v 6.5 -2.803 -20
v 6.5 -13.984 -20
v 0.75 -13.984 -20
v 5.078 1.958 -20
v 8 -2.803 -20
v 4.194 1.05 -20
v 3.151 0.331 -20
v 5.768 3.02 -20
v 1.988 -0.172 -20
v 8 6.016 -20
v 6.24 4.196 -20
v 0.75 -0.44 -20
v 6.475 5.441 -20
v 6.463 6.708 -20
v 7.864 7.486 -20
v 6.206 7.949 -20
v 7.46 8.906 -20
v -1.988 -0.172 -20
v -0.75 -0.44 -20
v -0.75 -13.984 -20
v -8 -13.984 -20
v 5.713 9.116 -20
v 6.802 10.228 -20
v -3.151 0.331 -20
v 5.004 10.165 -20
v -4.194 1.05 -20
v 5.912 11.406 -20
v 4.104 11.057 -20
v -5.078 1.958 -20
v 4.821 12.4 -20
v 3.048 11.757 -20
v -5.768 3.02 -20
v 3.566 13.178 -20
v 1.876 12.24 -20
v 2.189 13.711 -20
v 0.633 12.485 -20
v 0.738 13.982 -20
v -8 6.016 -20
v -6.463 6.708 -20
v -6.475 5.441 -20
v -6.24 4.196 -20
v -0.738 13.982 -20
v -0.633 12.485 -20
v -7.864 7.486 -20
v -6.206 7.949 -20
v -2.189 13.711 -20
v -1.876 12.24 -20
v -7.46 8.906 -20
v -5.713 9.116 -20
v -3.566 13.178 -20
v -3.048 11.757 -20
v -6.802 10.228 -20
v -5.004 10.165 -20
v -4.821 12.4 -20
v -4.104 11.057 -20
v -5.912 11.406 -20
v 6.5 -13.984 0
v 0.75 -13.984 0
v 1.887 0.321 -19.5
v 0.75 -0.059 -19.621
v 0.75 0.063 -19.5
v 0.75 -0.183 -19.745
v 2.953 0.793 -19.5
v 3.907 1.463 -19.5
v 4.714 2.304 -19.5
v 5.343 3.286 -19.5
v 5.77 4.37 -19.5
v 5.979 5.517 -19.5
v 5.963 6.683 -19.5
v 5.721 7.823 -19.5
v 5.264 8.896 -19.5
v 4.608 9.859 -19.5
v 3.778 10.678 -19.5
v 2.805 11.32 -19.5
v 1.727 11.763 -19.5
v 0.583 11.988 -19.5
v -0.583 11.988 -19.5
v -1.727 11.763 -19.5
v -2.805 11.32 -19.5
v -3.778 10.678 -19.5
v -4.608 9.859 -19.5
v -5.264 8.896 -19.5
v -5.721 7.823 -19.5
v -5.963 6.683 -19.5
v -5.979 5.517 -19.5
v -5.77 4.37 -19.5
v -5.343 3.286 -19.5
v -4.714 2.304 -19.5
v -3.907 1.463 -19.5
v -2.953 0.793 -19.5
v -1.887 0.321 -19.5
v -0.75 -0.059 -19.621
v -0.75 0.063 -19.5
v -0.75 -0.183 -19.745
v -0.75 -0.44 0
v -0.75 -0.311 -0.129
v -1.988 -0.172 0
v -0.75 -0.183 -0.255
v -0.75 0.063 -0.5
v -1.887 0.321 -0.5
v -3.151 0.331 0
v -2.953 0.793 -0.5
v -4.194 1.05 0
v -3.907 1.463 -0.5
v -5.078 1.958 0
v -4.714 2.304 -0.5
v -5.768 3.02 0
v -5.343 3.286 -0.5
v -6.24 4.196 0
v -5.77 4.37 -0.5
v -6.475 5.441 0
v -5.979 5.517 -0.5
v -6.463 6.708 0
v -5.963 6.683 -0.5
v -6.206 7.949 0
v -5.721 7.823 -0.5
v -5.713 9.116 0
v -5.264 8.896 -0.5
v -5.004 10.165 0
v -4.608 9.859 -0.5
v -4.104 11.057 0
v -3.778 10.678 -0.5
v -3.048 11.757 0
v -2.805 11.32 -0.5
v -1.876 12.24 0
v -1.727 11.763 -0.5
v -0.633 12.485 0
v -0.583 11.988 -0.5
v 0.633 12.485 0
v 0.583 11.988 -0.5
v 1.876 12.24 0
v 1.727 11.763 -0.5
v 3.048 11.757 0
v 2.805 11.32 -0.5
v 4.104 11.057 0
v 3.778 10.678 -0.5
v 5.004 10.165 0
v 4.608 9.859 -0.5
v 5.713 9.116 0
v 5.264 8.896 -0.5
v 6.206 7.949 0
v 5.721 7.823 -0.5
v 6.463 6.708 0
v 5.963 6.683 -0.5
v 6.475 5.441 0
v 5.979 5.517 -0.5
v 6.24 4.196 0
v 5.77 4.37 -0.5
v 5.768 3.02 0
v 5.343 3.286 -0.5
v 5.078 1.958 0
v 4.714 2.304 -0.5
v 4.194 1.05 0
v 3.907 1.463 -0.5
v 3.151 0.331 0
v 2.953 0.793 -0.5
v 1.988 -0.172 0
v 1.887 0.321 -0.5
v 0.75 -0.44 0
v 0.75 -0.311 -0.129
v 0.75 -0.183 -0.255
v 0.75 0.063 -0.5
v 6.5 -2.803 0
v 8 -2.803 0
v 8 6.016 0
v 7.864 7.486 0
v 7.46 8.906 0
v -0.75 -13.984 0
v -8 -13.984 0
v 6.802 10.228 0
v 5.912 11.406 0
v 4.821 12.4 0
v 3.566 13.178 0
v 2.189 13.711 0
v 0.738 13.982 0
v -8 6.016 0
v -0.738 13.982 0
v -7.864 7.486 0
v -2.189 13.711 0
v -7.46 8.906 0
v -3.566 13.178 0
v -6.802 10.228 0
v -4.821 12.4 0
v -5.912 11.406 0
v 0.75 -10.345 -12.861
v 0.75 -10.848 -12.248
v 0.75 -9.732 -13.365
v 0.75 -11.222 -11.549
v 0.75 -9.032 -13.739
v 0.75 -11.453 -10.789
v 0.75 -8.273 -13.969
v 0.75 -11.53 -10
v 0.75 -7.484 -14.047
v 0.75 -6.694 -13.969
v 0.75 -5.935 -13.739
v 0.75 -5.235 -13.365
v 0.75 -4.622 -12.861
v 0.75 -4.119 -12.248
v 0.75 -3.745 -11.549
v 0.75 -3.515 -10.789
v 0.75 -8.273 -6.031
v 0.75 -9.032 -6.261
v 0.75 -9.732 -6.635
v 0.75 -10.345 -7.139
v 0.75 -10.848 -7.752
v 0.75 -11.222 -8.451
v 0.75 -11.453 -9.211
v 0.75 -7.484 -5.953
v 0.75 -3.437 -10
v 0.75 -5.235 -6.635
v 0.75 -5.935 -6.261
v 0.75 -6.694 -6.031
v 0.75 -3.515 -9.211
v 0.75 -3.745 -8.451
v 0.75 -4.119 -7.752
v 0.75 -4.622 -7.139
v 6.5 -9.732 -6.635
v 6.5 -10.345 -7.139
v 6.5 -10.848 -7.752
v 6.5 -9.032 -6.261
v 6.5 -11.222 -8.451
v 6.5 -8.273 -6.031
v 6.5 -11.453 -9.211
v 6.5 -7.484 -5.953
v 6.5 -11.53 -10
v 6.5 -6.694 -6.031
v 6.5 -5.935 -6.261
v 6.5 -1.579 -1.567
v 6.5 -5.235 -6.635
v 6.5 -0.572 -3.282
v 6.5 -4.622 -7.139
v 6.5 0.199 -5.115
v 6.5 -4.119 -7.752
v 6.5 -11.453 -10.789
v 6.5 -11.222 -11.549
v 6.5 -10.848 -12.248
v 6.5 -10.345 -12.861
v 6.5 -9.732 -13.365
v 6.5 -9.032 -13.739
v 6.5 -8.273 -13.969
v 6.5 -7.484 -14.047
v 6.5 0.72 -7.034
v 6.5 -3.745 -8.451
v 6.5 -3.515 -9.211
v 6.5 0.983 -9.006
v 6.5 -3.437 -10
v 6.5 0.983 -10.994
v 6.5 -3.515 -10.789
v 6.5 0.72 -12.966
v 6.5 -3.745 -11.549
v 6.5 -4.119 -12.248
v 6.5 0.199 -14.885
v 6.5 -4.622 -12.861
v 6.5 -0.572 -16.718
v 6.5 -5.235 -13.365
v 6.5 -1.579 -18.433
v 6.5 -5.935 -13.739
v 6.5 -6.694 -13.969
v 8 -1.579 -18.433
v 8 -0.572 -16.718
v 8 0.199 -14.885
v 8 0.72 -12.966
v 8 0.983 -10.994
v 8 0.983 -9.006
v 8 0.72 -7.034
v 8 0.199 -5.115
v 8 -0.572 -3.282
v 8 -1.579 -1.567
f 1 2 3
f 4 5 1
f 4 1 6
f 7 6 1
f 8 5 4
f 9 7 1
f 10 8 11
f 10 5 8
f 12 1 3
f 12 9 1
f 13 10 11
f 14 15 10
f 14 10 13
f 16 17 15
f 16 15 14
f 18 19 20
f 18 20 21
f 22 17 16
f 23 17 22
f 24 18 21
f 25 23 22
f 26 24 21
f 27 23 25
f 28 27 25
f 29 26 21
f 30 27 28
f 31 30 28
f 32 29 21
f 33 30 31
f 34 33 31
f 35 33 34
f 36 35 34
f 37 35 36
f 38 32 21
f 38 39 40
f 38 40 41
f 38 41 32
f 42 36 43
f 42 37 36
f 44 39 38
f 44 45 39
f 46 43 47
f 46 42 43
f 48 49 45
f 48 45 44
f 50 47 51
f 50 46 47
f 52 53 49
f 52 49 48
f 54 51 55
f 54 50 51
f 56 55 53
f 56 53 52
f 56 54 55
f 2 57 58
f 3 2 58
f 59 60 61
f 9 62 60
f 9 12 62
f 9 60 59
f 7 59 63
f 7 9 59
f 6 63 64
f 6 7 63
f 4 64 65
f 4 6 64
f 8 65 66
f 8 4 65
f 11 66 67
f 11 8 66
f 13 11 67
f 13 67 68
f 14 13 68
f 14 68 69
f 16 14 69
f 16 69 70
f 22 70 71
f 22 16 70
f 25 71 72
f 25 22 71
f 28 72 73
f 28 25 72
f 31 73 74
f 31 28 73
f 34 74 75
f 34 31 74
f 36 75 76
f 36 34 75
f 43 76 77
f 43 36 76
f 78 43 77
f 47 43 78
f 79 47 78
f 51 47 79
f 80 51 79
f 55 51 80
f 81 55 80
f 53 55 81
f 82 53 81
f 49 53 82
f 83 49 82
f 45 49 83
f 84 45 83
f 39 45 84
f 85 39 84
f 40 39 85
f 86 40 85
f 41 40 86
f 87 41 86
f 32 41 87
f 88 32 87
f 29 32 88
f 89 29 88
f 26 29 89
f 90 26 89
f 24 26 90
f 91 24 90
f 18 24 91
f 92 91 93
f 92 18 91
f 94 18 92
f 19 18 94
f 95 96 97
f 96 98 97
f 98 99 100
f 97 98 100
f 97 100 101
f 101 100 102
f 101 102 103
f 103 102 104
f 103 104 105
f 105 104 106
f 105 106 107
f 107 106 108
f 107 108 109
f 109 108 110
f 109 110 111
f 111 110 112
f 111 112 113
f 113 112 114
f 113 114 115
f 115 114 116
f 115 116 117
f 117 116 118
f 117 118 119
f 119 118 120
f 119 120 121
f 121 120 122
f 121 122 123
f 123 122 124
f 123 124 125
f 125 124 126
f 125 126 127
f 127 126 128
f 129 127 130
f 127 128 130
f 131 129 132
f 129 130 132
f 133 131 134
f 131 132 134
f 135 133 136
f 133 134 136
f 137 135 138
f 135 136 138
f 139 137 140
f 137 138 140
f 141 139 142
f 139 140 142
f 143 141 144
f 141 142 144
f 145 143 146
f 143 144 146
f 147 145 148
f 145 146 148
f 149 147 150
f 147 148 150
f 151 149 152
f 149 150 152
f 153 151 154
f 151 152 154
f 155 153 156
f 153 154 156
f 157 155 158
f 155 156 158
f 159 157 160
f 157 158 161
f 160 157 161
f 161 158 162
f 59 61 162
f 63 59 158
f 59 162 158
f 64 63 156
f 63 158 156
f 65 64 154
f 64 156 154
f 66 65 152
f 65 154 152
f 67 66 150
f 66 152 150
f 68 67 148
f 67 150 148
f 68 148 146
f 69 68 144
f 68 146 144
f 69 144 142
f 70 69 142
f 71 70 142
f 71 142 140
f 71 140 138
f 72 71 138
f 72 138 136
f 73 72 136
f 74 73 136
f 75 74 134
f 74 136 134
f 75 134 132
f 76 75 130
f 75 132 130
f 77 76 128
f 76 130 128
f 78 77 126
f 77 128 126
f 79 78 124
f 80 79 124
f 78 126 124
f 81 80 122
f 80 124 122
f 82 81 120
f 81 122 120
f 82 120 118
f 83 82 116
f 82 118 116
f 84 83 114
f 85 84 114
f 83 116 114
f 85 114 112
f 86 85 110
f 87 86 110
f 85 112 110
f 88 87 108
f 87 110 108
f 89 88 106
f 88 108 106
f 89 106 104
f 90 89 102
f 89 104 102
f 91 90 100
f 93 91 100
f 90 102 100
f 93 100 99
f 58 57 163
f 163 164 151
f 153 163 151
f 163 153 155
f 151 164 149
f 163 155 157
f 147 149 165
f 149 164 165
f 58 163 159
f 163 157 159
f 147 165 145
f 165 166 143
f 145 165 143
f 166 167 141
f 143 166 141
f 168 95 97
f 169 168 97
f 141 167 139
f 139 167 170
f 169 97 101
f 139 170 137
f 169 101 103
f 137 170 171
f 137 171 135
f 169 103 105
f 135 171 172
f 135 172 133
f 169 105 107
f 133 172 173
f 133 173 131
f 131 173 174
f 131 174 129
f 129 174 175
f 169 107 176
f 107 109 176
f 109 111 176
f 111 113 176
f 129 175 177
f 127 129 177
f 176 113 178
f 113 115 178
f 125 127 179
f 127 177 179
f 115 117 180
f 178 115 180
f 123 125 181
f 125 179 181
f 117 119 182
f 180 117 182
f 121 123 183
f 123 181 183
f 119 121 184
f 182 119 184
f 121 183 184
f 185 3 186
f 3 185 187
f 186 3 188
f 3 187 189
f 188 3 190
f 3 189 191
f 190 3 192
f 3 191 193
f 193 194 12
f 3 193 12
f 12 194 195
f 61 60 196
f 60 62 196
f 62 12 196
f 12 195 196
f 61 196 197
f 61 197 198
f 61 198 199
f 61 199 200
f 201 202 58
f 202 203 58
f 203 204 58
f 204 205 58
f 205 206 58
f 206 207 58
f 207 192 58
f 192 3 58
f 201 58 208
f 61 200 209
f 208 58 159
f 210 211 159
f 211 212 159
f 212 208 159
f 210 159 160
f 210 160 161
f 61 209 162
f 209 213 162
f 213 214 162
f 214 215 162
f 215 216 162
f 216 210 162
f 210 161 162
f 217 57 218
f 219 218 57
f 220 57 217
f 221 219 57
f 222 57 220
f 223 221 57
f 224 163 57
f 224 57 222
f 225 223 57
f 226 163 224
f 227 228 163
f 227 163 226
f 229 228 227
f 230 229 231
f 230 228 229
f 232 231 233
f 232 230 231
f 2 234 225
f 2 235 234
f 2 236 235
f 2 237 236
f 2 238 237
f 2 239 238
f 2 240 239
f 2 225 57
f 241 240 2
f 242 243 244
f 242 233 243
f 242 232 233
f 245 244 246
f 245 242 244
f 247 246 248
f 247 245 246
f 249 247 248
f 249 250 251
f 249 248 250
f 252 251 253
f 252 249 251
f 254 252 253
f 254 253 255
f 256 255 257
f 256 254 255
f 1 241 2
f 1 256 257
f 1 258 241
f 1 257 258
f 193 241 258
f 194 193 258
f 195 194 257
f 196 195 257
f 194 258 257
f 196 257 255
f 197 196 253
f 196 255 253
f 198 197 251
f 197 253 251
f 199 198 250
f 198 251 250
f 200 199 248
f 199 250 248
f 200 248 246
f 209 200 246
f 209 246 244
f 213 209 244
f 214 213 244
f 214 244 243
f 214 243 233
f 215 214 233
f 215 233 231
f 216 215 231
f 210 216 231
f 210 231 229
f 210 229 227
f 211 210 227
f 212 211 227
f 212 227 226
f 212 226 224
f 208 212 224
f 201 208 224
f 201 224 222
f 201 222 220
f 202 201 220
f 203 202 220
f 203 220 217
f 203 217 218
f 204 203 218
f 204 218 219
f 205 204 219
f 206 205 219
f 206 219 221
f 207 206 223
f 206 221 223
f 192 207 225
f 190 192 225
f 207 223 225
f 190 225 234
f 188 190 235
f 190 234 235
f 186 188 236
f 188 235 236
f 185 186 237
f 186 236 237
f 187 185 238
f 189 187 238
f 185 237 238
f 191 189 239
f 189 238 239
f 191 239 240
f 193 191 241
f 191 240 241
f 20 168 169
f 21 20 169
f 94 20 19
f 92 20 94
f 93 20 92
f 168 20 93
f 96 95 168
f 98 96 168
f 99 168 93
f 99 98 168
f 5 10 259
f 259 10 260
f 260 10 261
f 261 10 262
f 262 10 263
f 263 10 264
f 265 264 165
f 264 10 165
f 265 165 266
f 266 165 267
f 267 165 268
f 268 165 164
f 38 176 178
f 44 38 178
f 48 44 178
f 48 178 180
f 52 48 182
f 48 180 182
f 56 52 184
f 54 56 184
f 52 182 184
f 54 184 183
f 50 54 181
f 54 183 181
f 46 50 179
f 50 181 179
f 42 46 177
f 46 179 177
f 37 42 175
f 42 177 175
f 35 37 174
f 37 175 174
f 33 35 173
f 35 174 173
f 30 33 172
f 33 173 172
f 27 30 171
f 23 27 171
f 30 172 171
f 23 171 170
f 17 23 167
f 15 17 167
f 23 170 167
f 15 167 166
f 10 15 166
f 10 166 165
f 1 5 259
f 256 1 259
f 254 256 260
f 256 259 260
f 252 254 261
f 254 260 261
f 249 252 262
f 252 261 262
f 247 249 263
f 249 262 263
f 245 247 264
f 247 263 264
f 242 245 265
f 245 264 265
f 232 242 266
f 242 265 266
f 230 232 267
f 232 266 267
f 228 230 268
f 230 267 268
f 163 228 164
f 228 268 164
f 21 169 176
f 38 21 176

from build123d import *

# Parameters (mm, degrees)
ESTRUSIONE_ESTRUSIONE1_DEPTH = 20
SCHIZZO3_R                   = 6
TAGLIO_ESTRUSIONE1_DEPTH     = 26.699370322
SCHIZZO4_W                   = 1.5
SCHIZZO4_H                   = 14.04705955
TAGLIO_ESTRUSIONE2_DEPTH     = 26.699370322
SCHIZZO5_R                   = 15
TAGLIO_ESTRUSIONE3_DEPTH     = 1.5
TAGLIO_ESTRUSIONE4_REACH     = 30.403
SCHIZZO6_R                   = 4.046600507
SMUSSO2_SIZE                 = 0.5
SMUSSO3_SIZE                 = 0.5


with BuildPart() as part:
    # Schizzo2 → Estrusione-Estrusione1 (new body)
    with BuildSketch(Plane.XY):
        with BuildLine():
            Line((8, -13.983665425), (-8, -13.983665425))
            Line((-8, -13.983665425), (-8, 6.016334575))
            ThreePointArc((-8, 6.016334575), (0, 14.016334575), (8, 6.016334575))
            Line((8, 6.016334575), (8, -13.983665425))
        make_face()
    extrude(amount=-ESTRUSIONE_ESTRUSIONE1_DEPTH)

    # Schizzo3 → Taglio-Estrusione1 (cut, through all)
    with BuildSketch(Plane.XY):
        with Locations((0, 6.016334575)):
            Circle(SCHIZZO3_R)
    extrude(amount=-TAGLIO_ESTRUSIONE1_DEPTH, mode=Mode.SUBTRACT)

    # Schizzo4 → Taglio-Estrusione2 (cut, through all)
    with BuildSketch(Plane.XY):
        with Locations((0, -6.96013565)):
            Rectangle(SCHIZZO4_W, SCHIZZO4_H)
    extrude(amount=-TAGLIO_ESTRUSIONE2_DEPTH, mode=Mode.SUBTRACT)

    # Schizzo5 → Taglio-Estrusione3 (cut)
    with BuildSketch(Plane(origin=(8, 0, 0), x_dir=(0, 0, -1), z_dir=(1, 0, 0))):
        with Locations((10, -13.983665425)):
            Circle(SCHIZZO5_R)
    extrude(amount=-TAGLIO_ESTRUSIONE3_DEPTH, mode=Mode.SUBTRACT)

    # Schizzo6 → Taglio-Estrusione4 (cut, up to next)
    with BuildSketch(Plane(origin=(6.5, 0, 0), x_dir=(0, 0, -1), z_dir=(1, 0, 0)), mode=Mode.PRIVATE) as taglio_estrusione4_sk1:
        with Locations((10, -7.483665425)):
            Circle(SCHIZZO6_R)
    taglio_estrusione4_tool1 = extrude(taglio_estrusione4_sk1.sketch, amount=-TAGLIO_ESTRUSIONE4_REACH, mode=Mode.PRIVATE) & part.part
    add(taglio_estrusione4_tool1.solids().sort_by_distance((6.5, -7.483665, -10))[0], mode=Mode.SUBTRACT)

    # Smusso2
    smusso2_edges = [part.edges().sort_by_distance(p)[0] for p in [
        (0, 12.016334575, 0),
    ]]
    chamfer(smusso2_edges, length=SMUSSO2_SIZE)

    # Smusso3
    smusso3_edges = [part.edges().sort_by_distance(p)[0] for p in [
        (0, 12.016334575, -20),
    ]]
    chamfer(smusso3_edges, length=SMUSSO3_SIZE)


solid = part.part
